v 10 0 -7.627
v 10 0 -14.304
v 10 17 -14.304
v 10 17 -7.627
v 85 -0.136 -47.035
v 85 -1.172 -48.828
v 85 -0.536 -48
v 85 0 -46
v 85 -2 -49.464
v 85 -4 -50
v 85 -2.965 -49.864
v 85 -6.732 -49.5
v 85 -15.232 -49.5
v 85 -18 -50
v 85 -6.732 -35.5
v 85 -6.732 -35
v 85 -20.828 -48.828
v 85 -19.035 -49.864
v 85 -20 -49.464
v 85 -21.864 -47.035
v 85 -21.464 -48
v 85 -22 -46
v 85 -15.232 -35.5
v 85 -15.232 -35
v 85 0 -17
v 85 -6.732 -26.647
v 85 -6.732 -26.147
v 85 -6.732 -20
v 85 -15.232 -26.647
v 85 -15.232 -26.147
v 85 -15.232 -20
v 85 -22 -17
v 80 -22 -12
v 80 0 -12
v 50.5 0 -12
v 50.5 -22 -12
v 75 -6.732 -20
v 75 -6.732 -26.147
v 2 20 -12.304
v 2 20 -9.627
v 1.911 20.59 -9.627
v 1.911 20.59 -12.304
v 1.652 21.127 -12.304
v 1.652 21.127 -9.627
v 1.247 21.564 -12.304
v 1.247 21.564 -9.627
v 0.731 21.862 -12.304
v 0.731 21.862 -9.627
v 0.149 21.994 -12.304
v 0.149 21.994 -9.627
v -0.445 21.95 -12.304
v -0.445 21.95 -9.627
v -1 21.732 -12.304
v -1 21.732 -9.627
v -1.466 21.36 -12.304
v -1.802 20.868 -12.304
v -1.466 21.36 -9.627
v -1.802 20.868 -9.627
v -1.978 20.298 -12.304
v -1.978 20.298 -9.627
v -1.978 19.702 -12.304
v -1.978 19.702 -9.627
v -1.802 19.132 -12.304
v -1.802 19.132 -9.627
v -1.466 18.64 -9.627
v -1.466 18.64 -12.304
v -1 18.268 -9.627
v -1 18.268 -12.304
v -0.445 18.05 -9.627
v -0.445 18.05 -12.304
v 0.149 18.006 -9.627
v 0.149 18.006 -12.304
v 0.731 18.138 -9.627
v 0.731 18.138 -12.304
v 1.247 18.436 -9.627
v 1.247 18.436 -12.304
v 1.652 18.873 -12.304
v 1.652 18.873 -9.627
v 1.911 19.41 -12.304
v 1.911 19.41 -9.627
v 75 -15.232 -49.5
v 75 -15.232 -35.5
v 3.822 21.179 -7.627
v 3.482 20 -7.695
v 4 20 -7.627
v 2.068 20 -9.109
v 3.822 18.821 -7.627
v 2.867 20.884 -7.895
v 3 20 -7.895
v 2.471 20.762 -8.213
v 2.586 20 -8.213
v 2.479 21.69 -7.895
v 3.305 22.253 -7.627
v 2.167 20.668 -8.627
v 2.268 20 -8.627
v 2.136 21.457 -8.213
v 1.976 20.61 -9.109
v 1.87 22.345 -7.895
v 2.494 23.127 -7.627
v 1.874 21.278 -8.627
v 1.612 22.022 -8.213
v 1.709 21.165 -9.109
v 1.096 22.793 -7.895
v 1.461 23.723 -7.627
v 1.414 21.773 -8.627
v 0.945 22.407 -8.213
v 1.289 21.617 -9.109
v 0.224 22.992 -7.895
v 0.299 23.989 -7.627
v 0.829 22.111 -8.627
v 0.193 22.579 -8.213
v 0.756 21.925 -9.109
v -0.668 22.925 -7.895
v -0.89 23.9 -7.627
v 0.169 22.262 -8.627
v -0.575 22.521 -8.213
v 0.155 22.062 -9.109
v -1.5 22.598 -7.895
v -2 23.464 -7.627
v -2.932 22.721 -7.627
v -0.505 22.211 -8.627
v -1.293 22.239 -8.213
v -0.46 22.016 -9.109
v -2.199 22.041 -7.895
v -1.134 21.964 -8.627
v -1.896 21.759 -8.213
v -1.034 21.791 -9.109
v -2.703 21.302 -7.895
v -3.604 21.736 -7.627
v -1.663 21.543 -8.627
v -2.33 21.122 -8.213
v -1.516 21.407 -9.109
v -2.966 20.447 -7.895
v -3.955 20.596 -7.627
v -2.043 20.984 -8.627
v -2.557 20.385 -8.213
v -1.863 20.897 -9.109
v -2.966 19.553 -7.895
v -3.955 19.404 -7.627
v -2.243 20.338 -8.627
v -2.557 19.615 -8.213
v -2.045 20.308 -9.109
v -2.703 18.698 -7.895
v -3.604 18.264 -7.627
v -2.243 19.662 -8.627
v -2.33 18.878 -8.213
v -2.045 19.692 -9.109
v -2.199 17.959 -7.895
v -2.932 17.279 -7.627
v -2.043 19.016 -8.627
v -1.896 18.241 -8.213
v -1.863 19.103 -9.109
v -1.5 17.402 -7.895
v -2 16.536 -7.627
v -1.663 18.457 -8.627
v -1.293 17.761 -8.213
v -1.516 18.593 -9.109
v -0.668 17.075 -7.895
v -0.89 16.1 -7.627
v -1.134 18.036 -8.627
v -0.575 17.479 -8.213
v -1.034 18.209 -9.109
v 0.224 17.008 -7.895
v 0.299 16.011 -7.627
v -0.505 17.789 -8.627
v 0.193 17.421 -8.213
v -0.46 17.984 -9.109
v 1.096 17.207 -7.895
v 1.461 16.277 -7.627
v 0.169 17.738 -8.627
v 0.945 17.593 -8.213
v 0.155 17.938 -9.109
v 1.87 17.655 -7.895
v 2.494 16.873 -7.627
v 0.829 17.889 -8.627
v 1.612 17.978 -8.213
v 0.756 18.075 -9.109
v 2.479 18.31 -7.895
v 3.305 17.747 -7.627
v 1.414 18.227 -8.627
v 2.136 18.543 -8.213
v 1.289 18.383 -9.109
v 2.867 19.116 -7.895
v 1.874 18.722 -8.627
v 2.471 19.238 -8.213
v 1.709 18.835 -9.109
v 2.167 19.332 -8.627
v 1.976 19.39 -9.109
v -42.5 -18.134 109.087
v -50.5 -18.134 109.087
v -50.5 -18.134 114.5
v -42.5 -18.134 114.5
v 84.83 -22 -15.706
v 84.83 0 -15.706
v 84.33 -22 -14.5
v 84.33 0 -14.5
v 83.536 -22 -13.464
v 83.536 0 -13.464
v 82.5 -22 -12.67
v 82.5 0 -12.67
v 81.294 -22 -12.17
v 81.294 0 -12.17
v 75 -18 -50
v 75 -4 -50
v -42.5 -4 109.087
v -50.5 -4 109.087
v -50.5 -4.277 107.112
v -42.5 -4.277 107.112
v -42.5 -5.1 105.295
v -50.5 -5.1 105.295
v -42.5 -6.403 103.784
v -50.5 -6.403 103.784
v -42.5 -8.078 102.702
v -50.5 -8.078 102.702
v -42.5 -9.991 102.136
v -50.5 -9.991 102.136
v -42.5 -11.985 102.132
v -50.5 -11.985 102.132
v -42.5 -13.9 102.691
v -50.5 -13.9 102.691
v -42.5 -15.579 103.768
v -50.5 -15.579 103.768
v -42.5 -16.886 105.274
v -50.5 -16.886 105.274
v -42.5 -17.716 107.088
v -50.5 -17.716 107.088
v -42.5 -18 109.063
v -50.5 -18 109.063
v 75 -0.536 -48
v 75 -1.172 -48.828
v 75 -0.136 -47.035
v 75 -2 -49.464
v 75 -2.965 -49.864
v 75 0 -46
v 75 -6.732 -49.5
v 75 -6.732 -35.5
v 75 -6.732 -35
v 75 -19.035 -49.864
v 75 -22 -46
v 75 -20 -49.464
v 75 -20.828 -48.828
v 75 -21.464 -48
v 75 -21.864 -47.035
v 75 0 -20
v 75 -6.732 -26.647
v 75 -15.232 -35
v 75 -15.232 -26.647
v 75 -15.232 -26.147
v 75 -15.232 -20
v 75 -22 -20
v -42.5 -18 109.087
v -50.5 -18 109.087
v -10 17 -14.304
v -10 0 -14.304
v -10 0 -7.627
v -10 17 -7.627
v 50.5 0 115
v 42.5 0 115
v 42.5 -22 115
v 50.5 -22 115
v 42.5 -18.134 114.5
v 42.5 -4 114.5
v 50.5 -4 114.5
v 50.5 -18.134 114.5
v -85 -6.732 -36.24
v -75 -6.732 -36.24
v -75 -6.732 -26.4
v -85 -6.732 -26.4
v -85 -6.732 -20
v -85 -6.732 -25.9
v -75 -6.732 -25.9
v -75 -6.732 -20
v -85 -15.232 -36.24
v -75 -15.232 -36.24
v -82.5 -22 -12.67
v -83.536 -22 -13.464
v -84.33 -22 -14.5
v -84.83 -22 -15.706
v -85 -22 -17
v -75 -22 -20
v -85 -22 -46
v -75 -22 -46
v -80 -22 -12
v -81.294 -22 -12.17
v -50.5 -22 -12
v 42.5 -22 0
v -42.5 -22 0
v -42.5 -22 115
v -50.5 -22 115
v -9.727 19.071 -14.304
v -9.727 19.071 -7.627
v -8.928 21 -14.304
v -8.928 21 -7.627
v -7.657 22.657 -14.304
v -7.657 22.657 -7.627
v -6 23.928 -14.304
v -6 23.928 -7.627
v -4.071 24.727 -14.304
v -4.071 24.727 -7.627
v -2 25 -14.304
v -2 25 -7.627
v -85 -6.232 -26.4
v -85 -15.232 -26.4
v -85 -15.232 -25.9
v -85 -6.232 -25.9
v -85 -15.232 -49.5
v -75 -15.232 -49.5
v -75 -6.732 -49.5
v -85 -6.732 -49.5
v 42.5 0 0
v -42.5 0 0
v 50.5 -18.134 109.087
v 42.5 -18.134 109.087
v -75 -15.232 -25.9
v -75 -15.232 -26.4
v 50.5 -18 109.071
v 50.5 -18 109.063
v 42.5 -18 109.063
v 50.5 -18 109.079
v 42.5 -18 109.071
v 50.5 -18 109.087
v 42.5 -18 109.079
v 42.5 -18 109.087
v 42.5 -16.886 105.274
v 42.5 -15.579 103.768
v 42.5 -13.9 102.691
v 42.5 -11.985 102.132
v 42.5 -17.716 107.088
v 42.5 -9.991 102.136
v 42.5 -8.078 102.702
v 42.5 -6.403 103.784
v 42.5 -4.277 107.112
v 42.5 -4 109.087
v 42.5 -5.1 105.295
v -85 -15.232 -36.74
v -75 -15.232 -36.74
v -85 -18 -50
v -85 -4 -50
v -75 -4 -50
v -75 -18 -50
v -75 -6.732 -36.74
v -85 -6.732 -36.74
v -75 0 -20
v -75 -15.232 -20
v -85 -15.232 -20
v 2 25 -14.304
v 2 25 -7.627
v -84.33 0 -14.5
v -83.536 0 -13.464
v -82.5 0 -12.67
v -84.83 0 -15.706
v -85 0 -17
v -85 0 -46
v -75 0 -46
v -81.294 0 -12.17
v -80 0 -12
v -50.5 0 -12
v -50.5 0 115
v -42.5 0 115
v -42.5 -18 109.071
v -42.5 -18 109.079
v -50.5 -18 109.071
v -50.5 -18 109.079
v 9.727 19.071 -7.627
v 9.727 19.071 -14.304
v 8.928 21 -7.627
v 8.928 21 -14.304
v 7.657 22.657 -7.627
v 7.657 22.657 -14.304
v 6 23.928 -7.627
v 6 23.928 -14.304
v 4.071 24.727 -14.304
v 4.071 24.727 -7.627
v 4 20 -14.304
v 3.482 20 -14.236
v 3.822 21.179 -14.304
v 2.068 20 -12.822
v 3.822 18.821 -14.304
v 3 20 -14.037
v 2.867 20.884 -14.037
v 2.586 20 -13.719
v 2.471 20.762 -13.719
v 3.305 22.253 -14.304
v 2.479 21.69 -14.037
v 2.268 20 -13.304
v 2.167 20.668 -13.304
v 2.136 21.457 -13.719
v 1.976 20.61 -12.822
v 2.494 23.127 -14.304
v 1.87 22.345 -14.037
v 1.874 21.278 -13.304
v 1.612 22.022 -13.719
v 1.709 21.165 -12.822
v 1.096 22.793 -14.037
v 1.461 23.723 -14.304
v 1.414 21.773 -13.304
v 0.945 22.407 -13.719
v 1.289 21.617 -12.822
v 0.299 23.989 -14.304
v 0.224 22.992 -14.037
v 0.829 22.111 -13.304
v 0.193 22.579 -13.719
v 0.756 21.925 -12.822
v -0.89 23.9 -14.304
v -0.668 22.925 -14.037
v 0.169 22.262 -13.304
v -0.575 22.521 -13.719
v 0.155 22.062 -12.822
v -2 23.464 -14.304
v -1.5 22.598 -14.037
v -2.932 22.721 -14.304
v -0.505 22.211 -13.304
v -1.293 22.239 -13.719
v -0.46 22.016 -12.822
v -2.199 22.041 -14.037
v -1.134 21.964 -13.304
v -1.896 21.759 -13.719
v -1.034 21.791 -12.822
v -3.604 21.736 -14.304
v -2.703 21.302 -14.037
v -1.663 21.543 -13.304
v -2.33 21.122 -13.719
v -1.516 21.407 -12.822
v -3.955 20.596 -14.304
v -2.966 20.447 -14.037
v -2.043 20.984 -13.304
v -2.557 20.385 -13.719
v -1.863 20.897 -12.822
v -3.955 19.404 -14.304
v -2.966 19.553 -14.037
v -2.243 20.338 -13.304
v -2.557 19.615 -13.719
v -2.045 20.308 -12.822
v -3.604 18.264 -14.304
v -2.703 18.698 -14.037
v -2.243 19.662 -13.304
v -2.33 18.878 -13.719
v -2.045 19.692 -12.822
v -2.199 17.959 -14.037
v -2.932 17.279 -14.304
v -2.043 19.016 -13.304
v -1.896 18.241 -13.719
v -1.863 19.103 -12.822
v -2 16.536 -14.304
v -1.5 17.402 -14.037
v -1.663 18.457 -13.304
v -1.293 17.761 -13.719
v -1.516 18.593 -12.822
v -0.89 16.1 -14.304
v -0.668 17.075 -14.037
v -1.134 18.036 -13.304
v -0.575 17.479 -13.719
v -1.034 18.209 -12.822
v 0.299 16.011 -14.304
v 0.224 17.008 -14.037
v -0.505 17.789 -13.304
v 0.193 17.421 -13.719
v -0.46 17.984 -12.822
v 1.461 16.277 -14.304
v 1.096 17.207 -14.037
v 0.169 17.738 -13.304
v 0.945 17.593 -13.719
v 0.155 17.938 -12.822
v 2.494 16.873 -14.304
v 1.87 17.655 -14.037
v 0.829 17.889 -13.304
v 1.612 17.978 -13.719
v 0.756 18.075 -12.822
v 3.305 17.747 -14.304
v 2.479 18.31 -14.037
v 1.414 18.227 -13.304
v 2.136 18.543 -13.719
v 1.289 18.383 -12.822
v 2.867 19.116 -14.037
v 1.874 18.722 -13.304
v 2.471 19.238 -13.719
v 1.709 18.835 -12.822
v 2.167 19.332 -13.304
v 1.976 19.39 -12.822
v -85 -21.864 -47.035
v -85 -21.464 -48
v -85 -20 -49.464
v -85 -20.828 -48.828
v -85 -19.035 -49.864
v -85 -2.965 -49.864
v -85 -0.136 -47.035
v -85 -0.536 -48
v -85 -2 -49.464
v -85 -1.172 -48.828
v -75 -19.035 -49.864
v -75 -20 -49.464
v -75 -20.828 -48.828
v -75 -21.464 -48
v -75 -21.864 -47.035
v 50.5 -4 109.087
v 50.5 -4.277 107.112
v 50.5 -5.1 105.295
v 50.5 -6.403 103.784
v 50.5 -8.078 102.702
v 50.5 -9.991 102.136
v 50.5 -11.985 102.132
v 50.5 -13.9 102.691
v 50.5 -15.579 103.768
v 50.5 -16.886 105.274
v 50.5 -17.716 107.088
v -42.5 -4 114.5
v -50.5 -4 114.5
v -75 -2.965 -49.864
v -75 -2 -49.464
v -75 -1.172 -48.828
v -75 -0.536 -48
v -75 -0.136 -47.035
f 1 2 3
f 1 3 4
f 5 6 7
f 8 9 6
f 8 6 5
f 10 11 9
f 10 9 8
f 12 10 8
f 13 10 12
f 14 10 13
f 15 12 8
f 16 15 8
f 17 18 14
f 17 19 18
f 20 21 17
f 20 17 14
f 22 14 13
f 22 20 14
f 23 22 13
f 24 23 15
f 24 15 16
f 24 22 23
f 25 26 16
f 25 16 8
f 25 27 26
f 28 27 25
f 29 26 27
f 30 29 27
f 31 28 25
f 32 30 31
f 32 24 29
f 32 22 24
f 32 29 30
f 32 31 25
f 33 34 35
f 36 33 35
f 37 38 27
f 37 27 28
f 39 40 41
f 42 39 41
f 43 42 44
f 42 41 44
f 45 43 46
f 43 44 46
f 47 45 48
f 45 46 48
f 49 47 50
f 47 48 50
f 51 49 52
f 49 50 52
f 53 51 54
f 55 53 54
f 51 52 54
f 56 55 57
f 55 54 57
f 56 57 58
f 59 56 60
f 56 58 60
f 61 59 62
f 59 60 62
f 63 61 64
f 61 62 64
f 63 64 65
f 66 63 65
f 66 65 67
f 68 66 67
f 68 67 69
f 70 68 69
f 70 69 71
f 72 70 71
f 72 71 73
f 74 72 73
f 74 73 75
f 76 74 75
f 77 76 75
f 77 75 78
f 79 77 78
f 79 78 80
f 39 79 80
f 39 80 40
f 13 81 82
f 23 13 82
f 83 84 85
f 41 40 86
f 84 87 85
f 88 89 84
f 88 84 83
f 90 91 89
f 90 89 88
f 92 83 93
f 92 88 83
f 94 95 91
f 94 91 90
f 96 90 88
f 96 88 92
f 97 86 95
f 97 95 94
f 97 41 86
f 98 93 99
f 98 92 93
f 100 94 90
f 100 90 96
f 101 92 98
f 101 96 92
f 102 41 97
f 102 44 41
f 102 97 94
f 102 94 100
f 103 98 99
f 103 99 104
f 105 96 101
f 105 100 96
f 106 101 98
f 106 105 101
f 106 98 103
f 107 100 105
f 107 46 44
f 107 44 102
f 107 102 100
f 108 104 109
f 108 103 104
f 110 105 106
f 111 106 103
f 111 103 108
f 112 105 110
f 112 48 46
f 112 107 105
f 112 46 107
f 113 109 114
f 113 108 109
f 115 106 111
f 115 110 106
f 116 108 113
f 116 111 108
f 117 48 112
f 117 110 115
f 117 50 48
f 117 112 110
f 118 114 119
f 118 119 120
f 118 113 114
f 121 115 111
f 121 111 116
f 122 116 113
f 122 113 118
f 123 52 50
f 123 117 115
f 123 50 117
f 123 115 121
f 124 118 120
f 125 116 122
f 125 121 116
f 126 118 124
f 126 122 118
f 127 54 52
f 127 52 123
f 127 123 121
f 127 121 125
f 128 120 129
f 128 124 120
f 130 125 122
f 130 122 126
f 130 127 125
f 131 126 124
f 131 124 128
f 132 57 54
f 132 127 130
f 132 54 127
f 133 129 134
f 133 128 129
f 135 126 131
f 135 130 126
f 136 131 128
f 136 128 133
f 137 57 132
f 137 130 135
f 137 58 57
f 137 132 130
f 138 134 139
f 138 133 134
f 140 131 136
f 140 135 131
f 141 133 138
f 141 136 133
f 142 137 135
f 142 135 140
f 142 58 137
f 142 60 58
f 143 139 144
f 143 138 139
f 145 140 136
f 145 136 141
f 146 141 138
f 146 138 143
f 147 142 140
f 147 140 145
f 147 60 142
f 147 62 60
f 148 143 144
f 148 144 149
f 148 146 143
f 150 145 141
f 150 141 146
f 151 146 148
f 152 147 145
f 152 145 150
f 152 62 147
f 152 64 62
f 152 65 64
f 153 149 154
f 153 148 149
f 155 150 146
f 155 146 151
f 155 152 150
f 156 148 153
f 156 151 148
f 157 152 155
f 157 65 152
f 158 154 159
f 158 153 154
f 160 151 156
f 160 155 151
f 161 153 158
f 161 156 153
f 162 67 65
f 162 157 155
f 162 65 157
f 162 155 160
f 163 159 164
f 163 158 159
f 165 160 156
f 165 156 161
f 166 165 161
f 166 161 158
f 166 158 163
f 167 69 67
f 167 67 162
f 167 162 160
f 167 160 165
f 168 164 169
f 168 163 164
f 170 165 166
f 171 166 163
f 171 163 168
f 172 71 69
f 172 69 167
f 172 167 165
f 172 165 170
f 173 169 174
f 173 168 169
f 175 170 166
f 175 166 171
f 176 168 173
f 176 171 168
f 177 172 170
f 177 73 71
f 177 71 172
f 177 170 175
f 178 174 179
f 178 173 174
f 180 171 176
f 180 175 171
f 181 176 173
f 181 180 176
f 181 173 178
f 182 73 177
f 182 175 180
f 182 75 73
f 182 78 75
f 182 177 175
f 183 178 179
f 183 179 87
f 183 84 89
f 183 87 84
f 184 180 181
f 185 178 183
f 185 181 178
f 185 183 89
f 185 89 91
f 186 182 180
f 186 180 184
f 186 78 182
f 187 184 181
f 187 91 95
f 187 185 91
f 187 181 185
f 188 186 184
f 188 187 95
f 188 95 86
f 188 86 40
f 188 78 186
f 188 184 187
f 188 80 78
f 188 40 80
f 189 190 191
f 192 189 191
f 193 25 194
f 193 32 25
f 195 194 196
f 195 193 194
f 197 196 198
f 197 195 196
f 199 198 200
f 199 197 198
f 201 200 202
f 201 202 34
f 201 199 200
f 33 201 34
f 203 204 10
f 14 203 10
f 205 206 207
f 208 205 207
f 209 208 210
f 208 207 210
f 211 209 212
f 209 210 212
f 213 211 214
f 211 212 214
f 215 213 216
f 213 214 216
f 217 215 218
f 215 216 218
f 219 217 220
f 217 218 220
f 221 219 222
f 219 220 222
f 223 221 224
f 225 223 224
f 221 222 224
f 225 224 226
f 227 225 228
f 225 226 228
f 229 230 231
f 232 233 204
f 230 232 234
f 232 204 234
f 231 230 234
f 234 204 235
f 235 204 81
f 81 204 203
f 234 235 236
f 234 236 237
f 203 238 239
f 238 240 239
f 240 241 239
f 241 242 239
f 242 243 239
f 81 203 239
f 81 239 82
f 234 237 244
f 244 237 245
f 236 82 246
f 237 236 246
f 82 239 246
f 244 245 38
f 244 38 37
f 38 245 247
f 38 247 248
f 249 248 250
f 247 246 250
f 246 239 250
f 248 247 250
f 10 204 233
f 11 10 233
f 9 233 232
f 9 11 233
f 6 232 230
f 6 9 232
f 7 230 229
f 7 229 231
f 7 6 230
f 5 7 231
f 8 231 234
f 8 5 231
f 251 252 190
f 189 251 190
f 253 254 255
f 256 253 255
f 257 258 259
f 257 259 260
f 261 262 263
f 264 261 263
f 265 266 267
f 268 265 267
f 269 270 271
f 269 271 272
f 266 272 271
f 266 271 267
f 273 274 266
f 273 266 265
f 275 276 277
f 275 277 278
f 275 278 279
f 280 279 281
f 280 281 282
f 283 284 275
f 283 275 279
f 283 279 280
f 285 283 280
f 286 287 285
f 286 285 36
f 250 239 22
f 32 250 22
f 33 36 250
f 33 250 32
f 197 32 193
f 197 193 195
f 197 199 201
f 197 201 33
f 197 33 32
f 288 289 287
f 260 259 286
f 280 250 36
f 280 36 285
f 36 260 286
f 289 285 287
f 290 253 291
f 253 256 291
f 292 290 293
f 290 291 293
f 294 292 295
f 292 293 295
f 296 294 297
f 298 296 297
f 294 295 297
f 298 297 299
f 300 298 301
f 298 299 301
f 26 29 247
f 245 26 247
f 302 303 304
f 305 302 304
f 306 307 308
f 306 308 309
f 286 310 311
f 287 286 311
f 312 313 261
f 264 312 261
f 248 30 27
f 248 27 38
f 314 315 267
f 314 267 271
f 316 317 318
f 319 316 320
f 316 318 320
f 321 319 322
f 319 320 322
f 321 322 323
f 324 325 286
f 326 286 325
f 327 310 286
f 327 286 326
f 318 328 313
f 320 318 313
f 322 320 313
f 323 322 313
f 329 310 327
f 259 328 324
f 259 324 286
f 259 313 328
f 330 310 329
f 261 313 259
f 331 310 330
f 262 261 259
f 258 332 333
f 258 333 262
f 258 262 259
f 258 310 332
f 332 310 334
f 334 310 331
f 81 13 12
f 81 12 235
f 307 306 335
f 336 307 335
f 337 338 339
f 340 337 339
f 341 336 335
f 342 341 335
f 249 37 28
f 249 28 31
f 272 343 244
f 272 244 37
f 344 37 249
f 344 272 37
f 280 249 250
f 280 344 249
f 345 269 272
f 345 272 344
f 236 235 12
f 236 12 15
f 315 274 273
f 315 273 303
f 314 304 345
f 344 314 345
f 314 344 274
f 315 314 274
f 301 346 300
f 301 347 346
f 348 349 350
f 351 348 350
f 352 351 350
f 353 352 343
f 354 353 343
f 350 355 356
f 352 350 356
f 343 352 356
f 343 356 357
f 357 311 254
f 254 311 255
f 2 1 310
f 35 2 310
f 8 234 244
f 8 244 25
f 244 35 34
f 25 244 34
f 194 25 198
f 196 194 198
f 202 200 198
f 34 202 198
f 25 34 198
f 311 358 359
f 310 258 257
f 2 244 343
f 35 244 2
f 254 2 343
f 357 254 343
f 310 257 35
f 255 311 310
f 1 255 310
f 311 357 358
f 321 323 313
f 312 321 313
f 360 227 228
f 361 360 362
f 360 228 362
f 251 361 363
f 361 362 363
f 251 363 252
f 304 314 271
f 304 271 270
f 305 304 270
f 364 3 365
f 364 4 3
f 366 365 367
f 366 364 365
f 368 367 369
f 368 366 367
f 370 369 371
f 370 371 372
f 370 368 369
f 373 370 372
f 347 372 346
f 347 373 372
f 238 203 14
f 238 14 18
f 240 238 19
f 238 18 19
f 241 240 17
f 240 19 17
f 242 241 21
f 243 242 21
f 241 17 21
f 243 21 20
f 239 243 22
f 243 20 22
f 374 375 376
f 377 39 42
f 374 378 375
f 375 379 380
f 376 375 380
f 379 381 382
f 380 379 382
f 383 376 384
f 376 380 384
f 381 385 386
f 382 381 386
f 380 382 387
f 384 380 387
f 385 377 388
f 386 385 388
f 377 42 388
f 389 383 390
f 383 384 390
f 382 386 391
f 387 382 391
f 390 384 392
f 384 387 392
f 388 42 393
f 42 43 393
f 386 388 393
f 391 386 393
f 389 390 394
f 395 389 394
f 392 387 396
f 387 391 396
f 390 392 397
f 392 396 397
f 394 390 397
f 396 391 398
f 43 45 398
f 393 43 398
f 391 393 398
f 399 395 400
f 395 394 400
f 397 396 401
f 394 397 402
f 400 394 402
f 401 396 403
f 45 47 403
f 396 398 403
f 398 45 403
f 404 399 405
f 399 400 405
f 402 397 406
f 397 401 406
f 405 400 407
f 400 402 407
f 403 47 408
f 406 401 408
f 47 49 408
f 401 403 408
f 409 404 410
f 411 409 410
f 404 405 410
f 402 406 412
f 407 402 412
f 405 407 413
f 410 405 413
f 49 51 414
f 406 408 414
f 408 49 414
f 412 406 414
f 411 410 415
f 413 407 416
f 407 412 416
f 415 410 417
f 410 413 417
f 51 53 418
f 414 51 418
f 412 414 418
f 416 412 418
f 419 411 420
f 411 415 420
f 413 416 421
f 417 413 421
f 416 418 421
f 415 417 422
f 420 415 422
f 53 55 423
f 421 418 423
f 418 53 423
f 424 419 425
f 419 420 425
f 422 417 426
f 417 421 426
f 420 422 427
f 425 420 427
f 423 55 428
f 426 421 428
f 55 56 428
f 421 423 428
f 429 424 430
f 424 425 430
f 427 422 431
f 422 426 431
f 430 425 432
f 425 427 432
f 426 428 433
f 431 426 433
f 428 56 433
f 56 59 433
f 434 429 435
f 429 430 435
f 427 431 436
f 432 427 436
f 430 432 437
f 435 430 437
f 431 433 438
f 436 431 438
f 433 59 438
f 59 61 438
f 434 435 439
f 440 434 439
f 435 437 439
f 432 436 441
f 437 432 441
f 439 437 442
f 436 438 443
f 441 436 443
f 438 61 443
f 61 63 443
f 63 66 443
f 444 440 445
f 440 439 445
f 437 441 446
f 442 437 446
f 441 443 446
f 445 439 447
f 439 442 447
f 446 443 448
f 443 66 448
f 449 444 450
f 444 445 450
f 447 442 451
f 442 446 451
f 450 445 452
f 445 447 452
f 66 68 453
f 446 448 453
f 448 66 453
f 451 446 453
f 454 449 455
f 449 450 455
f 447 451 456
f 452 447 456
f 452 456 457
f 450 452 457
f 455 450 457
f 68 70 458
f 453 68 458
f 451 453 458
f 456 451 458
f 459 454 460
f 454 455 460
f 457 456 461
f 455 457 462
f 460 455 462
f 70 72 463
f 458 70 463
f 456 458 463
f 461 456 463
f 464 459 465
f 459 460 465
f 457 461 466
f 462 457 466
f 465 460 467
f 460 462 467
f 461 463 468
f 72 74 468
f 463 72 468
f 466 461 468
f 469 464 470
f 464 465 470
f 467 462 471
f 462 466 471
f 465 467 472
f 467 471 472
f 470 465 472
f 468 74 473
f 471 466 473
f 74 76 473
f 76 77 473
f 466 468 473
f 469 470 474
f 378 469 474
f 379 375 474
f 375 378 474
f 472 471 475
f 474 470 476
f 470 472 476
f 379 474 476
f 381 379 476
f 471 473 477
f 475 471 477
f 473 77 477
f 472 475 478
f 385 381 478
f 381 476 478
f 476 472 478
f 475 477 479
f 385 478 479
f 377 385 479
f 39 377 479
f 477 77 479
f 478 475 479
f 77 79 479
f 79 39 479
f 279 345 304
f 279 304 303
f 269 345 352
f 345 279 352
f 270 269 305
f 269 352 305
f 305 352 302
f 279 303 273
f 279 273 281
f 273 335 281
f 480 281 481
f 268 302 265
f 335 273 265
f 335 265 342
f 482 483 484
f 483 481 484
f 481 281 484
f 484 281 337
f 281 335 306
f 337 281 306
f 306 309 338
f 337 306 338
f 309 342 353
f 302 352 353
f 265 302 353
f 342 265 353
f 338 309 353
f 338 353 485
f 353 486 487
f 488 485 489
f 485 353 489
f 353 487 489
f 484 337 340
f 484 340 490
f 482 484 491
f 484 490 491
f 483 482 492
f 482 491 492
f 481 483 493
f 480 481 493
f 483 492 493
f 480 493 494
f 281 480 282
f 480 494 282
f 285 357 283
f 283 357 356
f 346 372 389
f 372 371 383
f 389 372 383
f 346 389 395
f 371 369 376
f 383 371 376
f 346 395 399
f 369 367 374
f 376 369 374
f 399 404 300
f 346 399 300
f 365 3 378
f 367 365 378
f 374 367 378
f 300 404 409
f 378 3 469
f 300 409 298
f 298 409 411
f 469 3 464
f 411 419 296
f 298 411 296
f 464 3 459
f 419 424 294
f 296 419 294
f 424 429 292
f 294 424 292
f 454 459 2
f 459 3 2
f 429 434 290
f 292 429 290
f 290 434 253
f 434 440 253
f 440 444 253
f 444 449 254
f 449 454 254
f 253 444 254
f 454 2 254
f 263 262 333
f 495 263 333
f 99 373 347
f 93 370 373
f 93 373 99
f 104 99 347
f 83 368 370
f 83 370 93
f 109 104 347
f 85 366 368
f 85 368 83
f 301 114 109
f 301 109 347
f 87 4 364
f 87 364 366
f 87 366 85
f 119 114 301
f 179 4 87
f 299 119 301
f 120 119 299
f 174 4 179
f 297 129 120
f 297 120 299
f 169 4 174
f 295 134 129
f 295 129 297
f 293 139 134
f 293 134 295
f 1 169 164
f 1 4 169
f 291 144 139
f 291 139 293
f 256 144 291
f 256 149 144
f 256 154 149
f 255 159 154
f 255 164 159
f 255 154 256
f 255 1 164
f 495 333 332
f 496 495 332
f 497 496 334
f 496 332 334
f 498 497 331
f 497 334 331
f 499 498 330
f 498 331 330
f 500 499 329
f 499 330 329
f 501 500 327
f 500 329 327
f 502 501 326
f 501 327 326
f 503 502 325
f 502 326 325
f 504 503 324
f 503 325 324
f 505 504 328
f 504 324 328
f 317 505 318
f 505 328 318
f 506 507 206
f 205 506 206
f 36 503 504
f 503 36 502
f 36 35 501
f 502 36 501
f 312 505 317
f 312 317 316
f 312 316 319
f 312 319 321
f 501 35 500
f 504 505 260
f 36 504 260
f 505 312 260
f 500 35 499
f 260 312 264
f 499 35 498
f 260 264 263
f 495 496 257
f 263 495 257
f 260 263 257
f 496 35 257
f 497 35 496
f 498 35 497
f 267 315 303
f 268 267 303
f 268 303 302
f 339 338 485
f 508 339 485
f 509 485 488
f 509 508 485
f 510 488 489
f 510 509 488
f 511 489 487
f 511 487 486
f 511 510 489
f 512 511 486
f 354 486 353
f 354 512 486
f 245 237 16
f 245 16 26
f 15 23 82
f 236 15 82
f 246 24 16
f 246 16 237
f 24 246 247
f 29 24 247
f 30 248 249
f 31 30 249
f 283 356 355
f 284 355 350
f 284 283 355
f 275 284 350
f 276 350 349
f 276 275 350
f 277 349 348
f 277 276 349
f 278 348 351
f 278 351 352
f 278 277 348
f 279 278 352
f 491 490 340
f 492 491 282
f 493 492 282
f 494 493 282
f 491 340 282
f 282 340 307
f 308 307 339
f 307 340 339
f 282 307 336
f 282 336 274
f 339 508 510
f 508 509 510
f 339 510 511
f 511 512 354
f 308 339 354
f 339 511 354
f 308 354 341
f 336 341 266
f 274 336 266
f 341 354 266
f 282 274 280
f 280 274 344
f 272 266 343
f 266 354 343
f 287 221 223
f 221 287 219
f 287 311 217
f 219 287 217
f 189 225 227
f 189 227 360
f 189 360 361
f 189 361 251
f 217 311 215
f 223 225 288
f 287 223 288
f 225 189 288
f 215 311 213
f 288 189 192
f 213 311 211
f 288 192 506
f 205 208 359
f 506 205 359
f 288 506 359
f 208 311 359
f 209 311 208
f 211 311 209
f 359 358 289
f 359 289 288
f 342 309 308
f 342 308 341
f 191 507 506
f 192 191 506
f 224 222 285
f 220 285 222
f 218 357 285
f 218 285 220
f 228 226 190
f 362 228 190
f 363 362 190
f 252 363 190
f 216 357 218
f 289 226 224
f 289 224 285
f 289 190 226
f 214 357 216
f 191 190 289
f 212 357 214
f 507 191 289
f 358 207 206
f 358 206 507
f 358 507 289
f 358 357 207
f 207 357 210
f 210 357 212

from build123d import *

# Parameters (mm, degrees)
F1_DEPTH  = 22
F2_R      = 5
F4_DEPTH  = 180
F5_W      = 8
F5_H      = 0.5
F6_DEPTH  = 15
F7_W      = 8
F7_H      = 0.5
F8_DEPTH  = 15
F9_R      = 4
F10_W     = 8.5
F10_H     = 30
F11_DEPTH = 195
F12_W     = 20
F12_H     = 6.6774320376
F13_DEPTH = 25
F14_R     = 8
F15_R     = 2
F16_DEPTH = 25
F17_R     = 2
F18_W     = 10
F18_H     = 0.5
F19_DEPTH = 10
F20_W     = 10
F20_H     = 0.5
F21_DEPTH = 9


with BuildPart() as f1:
    # F0 (on Front) → F1 (new body)
    with BuildSketch(Plane.XZ):
        Polygon((-42.5, 0), (-42.5, 115), (-50.5, 115), (-50.5, -12), (0, -12), (50.5, -12), (50.5, 115), (42.5, 115), (42.5, 0), align=None)
        Polygon((0, -12), (-50.5, -12), (-85, -12), (-85, -50), (-75, -50), (-75, -20), (75, -20), (75, -50), (85, -50), (85, -12), (50.5, -12), align=None)
    extrude(amount=F1_DEPTH)

    # F2
    f2_edges = [f1.edges().sort_by_distance(p)[0] for p in [
        (-85, -11, -12),
        (85, -11, -12),
    ]]
    fillet(f2_edges, radius=F2_R)

    # F3 (on face) → F4 (cut)
    with BuildSketch(Plane(origin=(-50.5, 0, 0), x_dir=(0, -1, 0), z_dir=(-1, 0, 0))):
        with BuildLine():
            Line((4.0000428934, 115), (7.2924270352, 115))
            ThreePointArc((7.2924270352, 115), (11, 116.062500298), (14.7075729648, 115))
            Line((14.7075729648, 115), (18.1339288354, 115))
            Line((18.1339288354, 115), (18.1339288354, 118.5624971986))
            Line((18.1339288354, 118.5624971986), (4.0000428934, 118.5624971986))
            Line((4.0000428934, 118.5624971986), (4.0000428934, 115))
        make_face()
        with BuildLine():
            Line((17.9999571066, 109.0870055167), (4.0000428934, 109.0870055167))
            ThreePointArc((4.0000428934, 109.0870055167), (10.9877473719, 102.0625110214), (18, 109.062500298))
            ThreePointArc((18, 109.062500298), (17.9999892766, 109.0747529262), (17.9999571066, 109.0870055167))
        make_face()
        with BuildLine():
            ThreePointArc((7.2924270352, 115), (4.8841455219, 112.4678378735), (4.0000428934, 109.0870055167))
            Line((4.0000428934, 109.0870055167), (17.9999571066, 109.0870055167))
            ThreePointArc((17.9999571066, 109.0870055167), (17.1158544781, 112.4678378735), (14.7075729648, 115))
            Line((14.7075729648, 115), (7.2924270352, 115))
        make_face()
        with BuildLine():
            ThreePointArc((14.7075729648, 115), (17.1158544781, 112.4678378735), (17.9999571066, 109.0870055167))
            Line((17.9999571066, 109.0870055167), (18.1339288354, 109.0870055167))
            Line((18.1339288354, 109.0870055167), (18.1339288354, 115))
            Line((18.1339288354, 115), (14.7075729648, 115))
        make_face()
        with BuildLine():
            Line((4.0000428934, 115), (4.0000428934, 109.0870055167))
            ThreePointArc((4.0000428934, 109.0870055167), (4.8841455219, 112.4678378735), (7.2924270352, 115))
            Line((7.2924270352, 115), (4.0000428934, 115))
        make_face()
    extrude(amount=-F4_DEPTH, mode=Mode.SUBTRACT)

    # F5 (on face) → F6 (join)
    with BuildSketch(Plane.XZ.offset(4.0000428934)):
        with Locations((-46.5, 114.75)):
            Rectangle(F5_W, F5_H)
    extrude(amount=F6_DEPTH)

    # F7 (on face) → F8 (join)
    with BuildSketch(Plane.XZ.offset(4.0000428934)):
        with Locations((46.5, 114.75)):
            Rectangle(F7_W, F7_H)
    extrude(amount=F8_DEPTH)

    # F9
    f9_edges = [f1.edges().sort_by_distance(p)[0] for p in [
        (-80, -22, -50),
        (-80, 0, -50),
        (80, -22, -50),
        (80, 0, -50),
    ]]
    fillet(f9_edges, radius=F9_R)

    # F10 (on face) → F11 (cut)
    with BuildSketch(Plane(origin=(-85, 0, 0), x_dir=(0, -1, 0), z_dir=(-1, 0, 0))):
        with Locations((10.98183, -35)):
            Rectangle(F10_W, F10_H)
    extrude(amount=-F11_DEPTH, mode=Mode.SUBTRACT)

    # F12 (on face) → F13 (join)
    with BuildSketch(Plane(origin=(0, 0, 0), x_dir=(-1, 0, 0), z_dir=(0, 1, 0))):
        with Locations((0, -10.9657765897)):
            Rectangle(F12_W, F12_H)
    extrude(amount=F13_DEPTH)

    # F14
    f14_edges = [f1.edges().sort_by_distance(p)[0] for p in [
        (10, 25, -10.965777),
        (-10, 25, -10.965777),
    ]]
    fillet(f14_edges, radius=F14_R)

    # F15 (on face) → F16 (cut)
    with BuildSketch(Plane.XY.offset(-7.6270605709)):
        with Locations((0, 20)):
            Circle(F15_R)
    extrude(amount=-F16_DEPTH, mode=Mode.SUBTRACT)

    # F17
    f17_edges = [f1.edges().sort_by_distance(p)[0] for p in [
        (-2, 20, -7.627061),
        (-2, 20, -14.304493),
    ]]
    fillet(f17_edges, radius=F17_R)

    # F18 (on face) → F19 (join)
    with BuildSketch(Plane(origin=(0, -15.23183, 0), x_dir=(-1, 0, 0), z_dir=(0, 1, 0))):
        with Locations((-80, -26.3965432942)):
            Rectangle(F18_W, F18_H)
        with Locations((-80, -49.75)):
            Rectangle(F18_W, F18_H)
        with Locations((-80, -35.25)):
            Rectangle(F18_W, F18_H)
    extrude(amount=F19_DEPTH)

    # F20 (on face) → F21 (join)
    with BuildSketch(Plane(origin=(0, -15.23183, 0), x_dir=(-1, 0, 0), z_dir=(0, 1, 0))):
        with Locations((80.0000029802, -26.1500017196)):
            Rectangle(F20_W, F20_H)
        with Locations((80, -49.75)):
            Rectangle(F20_W, F20_H)
        with Locations((80, -36.490347743)):
            Rectangle(F20_W, F20_H)
    extrude(amount=F21_DEPTH)


solid = f1.part
